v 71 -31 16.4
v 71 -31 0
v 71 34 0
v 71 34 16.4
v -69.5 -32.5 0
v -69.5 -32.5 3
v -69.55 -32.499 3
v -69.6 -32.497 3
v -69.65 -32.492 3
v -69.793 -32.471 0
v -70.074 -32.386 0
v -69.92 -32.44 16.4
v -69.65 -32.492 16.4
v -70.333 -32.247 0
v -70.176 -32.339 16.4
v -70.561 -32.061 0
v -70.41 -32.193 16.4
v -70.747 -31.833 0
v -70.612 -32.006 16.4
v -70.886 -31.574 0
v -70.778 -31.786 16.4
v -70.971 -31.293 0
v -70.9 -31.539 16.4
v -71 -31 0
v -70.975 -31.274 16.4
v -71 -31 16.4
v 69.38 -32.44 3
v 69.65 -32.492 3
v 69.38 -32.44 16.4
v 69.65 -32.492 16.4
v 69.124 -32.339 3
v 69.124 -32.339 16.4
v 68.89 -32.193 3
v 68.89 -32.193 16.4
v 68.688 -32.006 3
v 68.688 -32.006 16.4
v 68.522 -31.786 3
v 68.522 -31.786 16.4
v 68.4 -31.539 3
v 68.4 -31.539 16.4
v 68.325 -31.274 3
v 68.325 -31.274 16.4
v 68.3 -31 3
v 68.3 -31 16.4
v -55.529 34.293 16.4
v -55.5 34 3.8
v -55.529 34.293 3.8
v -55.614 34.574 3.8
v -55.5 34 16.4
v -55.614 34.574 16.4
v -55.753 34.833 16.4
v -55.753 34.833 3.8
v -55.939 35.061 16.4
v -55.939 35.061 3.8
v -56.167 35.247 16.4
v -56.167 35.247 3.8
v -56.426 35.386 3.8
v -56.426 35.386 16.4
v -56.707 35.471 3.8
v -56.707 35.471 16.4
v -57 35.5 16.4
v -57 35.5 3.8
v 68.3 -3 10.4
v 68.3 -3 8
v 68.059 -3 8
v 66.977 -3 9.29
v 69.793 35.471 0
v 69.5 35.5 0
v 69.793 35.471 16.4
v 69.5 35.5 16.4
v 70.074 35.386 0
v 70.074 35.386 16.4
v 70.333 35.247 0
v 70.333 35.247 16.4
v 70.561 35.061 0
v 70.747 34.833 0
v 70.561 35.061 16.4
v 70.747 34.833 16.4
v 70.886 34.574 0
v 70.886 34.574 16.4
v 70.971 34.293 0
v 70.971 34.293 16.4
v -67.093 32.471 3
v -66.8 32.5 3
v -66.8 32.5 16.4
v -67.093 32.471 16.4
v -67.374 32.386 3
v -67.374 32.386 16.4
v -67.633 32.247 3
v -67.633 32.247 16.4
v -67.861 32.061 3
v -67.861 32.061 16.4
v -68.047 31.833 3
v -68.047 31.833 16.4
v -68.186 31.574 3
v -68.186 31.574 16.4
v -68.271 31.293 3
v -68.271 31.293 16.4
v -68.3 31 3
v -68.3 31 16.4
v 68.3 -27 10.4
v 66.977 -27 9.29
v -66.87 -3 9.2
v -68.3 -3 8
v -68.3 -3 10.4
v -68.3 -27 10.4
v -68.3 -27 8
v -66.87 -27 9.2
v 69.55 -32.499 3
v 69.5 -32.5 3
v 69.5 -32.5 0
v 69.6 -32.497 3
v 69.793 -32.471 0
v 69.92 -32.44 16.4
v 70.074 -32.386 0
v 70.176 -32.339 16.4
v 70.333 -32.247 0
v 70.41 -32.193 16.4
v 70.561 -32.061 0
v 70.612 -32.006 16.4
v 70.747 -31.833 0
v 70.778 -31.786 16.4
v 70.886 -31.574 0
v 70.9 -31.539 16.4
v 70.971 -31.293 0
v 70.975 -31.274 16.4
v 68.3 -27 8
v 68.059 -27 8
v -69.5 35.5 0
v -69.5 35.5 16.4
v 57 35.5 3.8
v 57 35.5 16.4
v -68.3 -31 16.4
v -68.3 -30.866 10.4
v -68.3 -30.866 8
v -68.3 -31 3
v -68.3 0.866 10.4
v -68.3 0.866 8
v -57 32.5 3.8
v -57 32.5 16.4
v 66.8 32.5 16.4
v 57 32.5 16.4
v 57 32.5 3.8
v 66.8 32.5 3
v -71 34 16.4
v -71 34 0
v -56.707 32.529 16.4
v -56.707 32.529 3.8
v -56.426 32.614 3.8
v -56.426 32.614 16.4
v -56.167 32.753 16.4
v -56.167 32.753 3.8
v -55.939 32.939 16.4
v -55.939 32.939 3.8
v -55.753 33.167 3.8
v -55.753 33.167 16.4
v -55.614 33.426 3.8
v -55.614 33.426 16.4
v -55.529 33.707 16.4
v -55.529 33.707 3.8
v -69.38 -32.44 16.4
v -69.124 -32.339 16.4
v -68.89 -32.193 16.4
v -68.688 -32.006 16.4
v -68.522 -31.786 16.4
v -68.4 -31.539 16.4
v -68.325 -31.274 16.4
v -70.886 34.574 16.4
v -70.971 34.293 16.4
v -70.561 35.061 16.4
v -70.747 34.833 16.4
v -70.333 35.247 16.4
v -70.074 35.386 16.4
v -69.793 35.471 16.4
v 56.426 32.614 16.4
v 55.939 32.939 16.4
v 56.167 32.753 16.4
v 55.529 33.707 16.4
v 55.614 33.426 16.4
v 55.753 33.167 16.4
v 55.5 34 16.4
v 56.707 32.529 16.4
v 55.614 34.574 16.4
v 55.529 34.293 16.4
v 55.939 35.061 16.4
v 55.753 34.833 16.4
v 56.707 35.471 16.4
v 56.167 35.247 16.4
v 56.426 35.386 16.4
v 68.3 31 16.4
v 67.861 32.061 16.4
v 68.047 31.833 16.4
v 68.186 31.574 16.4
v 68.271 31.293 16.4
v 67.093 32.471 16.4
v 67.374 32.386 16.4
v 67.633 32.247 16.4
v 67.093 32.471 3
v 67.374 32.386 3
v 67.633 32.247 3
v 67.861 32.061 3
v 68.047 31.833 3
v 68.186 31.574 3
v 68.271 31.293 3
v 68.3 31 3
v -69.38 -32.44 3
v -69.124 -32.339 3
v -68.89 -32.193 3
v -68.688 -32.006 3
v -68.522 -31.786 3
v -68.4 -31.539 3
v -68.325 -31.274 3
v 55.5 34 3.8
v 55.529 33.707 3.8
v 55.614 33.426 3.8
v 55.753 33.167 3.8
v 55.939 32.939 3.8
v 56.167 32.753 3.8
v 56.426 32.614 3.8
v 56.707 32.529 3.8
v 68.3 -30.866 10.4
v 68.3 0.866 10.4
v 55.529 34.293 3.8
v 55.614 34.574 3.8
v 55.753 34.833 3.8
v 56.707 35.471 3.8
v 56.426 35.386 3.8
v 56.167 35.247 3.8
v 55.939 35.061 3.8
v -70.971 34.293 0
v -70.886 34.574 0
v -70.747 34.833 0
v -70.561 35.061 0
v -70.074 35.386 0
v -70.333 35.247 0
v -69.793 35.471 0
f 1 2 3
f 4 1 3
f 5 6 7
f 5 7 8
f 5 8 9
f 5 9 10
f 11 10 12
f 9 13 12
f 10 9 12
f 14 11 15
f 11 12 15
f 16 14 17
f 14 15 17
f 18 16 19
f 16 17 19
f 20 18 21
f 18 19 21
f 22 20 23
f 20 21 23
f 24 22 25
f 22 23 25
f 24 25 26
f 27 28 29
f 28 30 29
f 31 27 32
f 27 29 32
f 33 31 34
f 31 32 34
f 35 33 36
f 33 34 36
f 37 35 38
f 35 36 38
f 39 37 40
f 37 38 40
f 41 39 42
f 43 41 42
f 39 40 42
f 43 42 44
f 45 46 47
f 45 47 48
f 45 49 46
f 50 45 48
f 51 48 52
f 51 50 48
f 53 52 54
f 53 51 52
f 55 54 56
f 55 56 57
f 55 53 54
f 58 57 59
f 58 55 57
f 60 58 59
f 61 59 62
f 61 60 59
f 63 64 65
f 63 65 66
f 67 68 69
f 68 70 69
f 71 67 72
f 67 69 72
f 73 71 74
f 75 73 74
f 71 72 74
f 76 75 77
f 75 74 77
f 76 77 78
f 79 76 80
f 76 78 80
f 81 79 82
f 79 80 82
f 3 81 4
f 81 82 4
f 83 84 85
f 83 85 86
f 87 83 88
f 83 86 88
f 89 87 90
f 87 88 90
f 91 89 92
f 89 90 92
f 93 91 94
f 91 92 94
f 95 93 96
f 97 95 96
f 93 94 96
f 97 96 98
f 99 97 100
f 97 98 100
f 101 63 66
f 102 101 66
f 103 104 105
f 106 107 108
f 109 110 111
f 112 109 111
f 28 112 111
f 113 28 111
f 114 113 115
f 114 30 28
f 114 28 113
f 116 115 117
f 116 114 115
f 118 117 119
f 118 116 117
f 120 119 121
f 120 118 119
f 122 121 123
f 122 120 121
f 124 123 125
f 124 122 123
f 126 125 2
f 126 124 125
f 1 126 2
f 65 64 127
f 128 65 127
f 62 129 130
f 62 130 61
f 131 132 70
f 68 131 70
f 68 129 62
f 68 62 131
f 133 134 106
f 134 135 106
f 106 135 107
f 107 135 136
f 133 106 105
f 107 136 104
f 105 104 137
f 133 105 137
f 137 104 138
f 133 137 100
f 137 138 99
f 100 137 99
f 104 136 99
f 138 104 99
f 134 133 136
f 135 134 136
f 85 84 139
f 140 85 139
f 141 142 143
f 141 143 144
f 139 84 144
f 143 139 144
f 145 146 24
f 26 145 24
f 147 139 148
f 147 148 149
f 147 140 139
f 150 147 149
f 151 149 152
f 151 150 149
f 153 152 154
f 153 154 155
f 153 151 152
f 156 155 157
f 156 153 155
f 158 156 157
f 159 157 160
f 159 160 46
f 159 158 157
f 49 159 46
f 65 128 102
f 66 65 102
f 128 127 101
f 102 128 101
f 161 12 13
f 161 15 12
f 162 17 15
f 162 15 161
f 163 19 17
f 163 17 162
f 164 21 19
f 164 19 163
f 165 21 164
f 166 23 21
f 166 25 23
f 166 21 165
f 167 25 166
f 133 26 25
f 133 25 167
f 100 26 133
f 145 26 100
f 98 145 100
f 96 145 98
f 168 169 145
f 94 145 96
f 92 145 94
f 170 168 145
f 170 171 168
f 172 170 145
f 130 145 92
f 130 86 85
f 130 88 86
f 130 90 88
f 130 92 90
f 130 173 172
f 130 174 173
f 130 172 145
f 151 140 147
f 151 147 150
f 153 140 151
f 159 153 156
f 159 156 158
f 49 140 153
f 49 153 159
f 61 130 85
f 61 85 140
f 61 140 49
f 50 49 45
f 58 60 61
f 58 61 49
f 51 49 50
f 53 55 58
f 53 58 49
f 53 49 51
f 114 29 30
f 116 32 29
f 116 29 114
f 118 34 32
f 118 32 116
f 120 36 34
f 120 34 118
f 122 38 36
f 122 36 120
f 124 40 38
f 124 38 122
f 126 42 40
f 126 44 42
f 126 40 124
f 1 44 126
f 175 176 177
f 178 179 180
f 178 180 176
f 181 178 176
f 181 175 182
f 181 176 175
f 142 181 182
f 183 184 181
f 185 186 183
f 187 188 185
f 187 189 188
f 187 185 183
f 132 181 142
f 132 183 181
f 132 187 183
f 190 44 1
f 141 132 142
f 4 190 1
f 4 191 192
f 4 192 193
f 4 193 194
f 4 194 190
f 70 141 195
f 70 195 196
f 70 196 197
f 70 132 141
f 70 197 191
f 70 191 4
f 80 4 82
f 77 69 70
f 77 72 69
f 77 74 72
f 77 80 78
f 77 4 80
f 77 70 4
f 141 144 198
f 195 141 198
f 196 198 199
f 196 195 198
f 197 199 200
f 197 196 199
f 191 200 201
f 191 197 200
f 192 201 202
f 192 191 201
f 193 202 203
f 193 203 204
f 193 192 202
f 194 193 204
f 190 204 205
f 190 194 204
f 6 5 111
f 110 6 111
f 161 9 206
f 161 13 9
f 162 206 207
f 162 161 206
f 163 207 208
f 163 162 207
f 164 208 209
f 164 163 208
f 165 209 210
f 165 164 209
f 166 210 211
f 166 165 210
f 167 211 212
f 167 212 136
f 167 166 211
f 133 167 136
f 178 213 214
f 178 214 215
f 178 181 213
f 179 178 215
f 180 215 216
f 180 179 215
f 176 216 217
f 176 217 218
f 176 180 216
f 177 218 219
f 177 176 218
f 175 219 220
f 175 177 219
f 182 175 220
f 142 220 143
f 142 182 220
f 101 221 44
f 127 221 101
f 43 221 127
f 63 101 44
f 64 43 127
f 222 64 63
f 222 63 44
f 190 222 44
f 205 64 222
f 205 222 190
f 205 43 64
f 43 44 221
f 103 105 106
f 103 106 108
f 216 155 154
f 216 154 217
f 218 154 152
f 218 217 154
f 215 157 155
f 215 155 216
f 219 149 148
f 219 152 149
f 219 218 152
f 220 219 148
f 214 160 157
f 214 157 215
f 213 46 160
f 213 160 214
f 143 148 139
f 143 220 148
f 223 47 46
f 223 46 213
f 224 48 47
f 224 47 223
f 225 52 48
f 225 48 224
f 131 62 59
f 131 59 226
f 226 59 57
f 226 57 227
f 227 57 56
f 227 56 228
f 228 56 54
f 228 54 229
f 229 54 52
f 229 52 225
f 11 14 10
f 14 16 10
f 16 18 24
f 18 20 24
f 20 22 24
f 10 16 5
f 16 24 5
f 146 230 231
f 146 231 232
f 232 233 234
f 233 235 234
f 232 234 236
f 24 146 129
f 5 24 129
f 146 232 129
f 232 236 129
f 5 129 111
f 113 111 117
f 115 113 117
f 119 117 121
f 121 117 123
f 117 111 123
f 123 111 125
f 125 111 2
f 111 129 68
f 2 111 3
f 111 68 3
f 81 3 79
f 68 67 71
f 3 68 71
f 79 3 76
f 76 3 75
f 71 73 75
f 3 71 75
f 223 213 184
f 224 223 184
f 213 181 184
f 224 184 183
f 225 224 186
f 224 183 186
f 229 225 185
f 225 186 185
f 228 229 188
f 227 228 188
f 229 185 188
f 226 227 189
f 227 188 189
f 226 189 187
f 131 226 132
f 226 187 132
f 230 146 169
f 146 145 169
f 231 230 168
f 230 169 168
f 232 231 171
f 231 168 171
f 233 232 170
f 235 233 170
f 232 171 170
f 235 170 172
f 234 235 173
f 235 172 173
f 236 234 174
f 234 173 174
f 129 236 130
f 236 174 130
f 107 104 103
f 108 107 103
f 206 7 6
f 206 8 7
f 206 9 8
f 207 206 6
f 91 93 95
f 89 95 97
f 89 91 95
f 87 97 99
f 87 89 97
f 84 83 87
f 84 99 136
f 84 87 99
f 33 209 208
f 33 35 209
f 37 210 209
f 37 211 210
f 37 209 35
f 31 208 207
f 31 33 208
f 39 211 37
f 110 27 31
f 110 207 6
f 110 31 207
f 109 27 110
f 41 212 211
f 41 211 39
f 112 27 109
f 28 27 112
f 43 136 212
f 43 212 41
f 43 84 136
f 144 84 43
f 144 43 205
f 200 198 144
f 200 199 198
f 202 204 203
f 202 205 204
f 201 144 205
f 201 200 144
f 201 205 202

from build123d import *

# Parameters (mm, degrees)
F1_DEPTH     = 3
F0_W         = 2.7
F0_H         = 65
F2_DEPTH     = 16.4
F0_W_2       = 111
F0_H_2       = 3
F3_DEPTH     = 3.8
F4_W         = 24
F4_H         = 2.4
F5_DEPTH     = 1.5
F6_W         = 24
F6_H         = 2.4
F7_DEPTH     = 1.5
F8_T1_DEPTH  = 31.73221831
F8_T6_DEPTH  = 31.73221831
F8_T11_DEPTH = 31.73221831
F8_T16_DEPTH = 31.73221831
F9_F1_R      = 1.5
F9_F2_R      = 1.5
F9_F3_R      = 1.4999
F9_F4_R      = 1.4999
F9_F5_R      = 1.5
F9_F6_R      = 1.5
F9_F7_R      = 1.5
F9_F8_R      = 1.5
F9_F9_R      = 1.5
F9_F10_R     = 1.5
F9_F11_R     = 1.5
F9_F12_R     = 1.5


# Not quite as in the source:
# - a fillet or chamfer that OpenCascade refuses, or shapes differently, is made with other operations: its cross-section is extruded or revolved along the edge and cut away or added
# - a fillet or chamfer is up to 0.001 mm smaller than in the source, because OpenCascade refuses the exact size


with BuildPart() as f1:
    # F0 (on Top) → F1 (new body)
    with BuildSketch(Plane.XY):
        Polygon((-68.3, -32.5), (68.3, -32.5), (68.3, 32.5), (55.5, 32.5), (-55.5, 32.5), (-68.3, 32.5), align=None)
    extrude(amount=F1_DEPTH)

    # F0 (on Top) → F2 (join)
    with BuildSketch(Plane.XY):
        Polygon((-71, 32.5), (-68.3, 32.5), (-55.5, 32.5), (-55.5, 35.5), (-71, 35.5), align=None)
        with Locations((-69.65, 0)):
            Rectangle(F0_W, F0_H)
        Polygon((68.3, 32.5), (71, 32.5), (71, 35.5), (55.5, 35.5), (55.5, 32.5), align=None)
        with Locations((69.65, 0)):
            Rectangle(F0_W, F0_H)
    extrude(amount=F2_DEPTH)

    # F0 (on Top) → F3 (join)
    with BuildSketch(Plane.XY):
        with Locations((0, 34)):
            Rectangle(F0_W_2, F0_H_2)
    extrude(amount=F3_DEPTH)

    # F4 (on face) → F5 (join)
    with BuildSketch(Plane.YZ.offset(-68.3)):
        with Locations((-15, 9.2)):
            Rectangle(F4_W, F4_H)
    extrude(amount=F5_DEPTH)

    # F6 (on face) → F7 (join)
    with BuildSketch(Plane(origin=(68.3, 0, 0), x_dir=(0, -1, 0), z_dir=(-1, 0, 0))):
        with Locations((15, 9.2)):
            Rectangle(F6_W, F6_H)
    extrude(amount=F7_DEPTH)

    # F8: chamfer of 1.5 x 1.2586494468 on 4 edges, made by hand

    # F8_s2 → F8_t1 (cut)
    with BuildSketch(Plane.XZ.offset(-0.866109155)):
        Polygon((68.0586494468, 8), (66.8, 9.5), (66.8, 8), align=None)
    extrude(amount=F8_T1_DEPTH, mode=Mode.SUBTRACT)


with BuildPart() as f8_tool4:
    # F8_s5 → F8_t6 (new body)
    with BuildSketch(Plane.XZ.offset(-0.866109155)):
        Polygon((-68.3, 10.4), (-66.8, 9.1413505532), (-66.8, 10.4), align=None)
    extrude(amount=F8_T6_DEPTH)

    split(bisect_by=Plane.YZ.offset(-68.3), keep=Keep.TOP)


with BuildPart() as f1_1:
    add(f1.part)

    # F8_t3: cut F8_tool4
    add(f8_tool4.part, mode=Mode.SUBTRACT)


with BuildPart() as f8_tool9:
    # F8_s10 → F8_t11 (new body)
    with BuildSketch(Plane.XZ.offset(30.866109155)):
        Polygon((68.3, 10.4), (66.8, 9.1413505532), (66.8, 10.4), align=None)
    extrude(amount=-F8_T11_DEPTH)

    split(bisect_by=Plane.YZ.offset(68.3), keep=Keep.BOTTOM)


with BuildPart() as f1_2:
    add(f1_1.part)

    # F8_t8: cut F8_tool9
    add(f8_tool9.part, mode=Mode.SUBTRACT)


with BuildPart() as f8_tool14:
    # F8_s15 → F8_t16 (new body)
    with BuildSketch(Plane.XZ.offset(30.866109155)):
        Polygon((-68.3, 8), (-66.8, 9.2586494468), (-66.8, 8), align=None)
    extrude(amount=-F8_T16_DEPTH)

    split(bisect_by=Plane.YZ.offset(-68.3), keep=Keep.TOP)


with BuildPart() as f1_3:
    add(f1_2.part)

    # F8_t13: cut F8_tool14
    add(f8_tool14.part, mode=Mode.SUBTRACT)

    # F9: fillet of radius 1.5 on 12 edges, made by hand

    # F9_f1
    f9_f1_edges = [f1_3.edges().sort_by_distance(p)[0] for p in [
        (55.5, 35.5, 10.1),
    ]]
    fillet(f9_f1_edges, radius=F9_F1_R)

    # F9_f2
    f9_f2_edges = [f1_3.edges().sort_by_distance(p)[0] for p in [
        (-55.5, 35.5, 10.1),
    ]]
    fillet(f9_f2_edges, radius=F9_F2_R)

    # F9_f3 (radius 1.5 in the source; OpenCascade refuses exactly that, so slightly less here)
    f9_f3_edges = [f1_3.edges().sort_by_distance(p)[0] for p in [
        (-55.5, 32.5, 10.1),
    ]]
    fillet(f9_f3_edges, radius=F9_F3_R)

    # F9_f4 (radius 1.5 in the source; OpenCascade refuses exactly that, so slightly less here)
    f9_f4_edges = [f1_3.edges().sort_by_distance(p)[0] for p in [
        (55.5, 32.5, 10.1),
    ]]
    fillet(f9_f4_edges, radius=F9_F4_R)

    # F9_f5
    f9_f5_edges = [f1_3.edges().sort_by_distance(p)[0] for p in [
        (-68.3, -32.5, 9.7),
    ]]
    fillet(f9_f5_edges, radius=F9_F5_R)

    # F9_f6
    f9_f6_edges = [f1_3.edges().sort_by_distance(p)[0] for p in [
        (68.3, -32.5, 9.7),
    ]]
    fillet(f9_f6_edges, radius=F9_F6_R)

    # F9_f7
    f9_f7_edges = [f1_3.edges().sort_by_distance(p)[0] for p in [
        (-68.3, 32.5, 9.7),
    ]]
    fillet(f9_f7_edges, radius=F9_F7_R)

    # F9_f8
    f9_f8_edges = [f1_3.edges().sort_by_distance(p)[0] for p in [
        (68.3, 32.5, 9.7),
    ]]
    fillet(f9_f8_edges, radius=F9_F8_R)

    # F9_f9
    f9_f9_edges = [f1_3.edges().sort_by_distance(p)[0] for p in [
        (-71, -32.5, 8.2),
    ]]
    fillet(f9_f9_edges, radius=F9_F9_R)

    # F9_f10
    f9_f10_edges = [f1_3.edges().sort_by_distance(p)[0] for p in [
        (71, -32.5, 8.2),
    ]]
    fillet(f9_f10_edges, radius=F9_F10_R)

    # F9_f11
    f9_f11_edges = [f1_3.edges().sort_by_distance(p)[0] for p in [
        (-71, 35.5, 8.2),
    ]]
    fillet(f9_f11_edges, radius=F9_F11_R)

    # F9_f12
    f9_f12_edges = [f1_3.edges().sort_by_distance(p)[0] for p in [
        (71, 35.5, 8.2),
    ]]
    fillet(f9_f12_edges, radius=F9_F12_R)


solid = f1_3.part
